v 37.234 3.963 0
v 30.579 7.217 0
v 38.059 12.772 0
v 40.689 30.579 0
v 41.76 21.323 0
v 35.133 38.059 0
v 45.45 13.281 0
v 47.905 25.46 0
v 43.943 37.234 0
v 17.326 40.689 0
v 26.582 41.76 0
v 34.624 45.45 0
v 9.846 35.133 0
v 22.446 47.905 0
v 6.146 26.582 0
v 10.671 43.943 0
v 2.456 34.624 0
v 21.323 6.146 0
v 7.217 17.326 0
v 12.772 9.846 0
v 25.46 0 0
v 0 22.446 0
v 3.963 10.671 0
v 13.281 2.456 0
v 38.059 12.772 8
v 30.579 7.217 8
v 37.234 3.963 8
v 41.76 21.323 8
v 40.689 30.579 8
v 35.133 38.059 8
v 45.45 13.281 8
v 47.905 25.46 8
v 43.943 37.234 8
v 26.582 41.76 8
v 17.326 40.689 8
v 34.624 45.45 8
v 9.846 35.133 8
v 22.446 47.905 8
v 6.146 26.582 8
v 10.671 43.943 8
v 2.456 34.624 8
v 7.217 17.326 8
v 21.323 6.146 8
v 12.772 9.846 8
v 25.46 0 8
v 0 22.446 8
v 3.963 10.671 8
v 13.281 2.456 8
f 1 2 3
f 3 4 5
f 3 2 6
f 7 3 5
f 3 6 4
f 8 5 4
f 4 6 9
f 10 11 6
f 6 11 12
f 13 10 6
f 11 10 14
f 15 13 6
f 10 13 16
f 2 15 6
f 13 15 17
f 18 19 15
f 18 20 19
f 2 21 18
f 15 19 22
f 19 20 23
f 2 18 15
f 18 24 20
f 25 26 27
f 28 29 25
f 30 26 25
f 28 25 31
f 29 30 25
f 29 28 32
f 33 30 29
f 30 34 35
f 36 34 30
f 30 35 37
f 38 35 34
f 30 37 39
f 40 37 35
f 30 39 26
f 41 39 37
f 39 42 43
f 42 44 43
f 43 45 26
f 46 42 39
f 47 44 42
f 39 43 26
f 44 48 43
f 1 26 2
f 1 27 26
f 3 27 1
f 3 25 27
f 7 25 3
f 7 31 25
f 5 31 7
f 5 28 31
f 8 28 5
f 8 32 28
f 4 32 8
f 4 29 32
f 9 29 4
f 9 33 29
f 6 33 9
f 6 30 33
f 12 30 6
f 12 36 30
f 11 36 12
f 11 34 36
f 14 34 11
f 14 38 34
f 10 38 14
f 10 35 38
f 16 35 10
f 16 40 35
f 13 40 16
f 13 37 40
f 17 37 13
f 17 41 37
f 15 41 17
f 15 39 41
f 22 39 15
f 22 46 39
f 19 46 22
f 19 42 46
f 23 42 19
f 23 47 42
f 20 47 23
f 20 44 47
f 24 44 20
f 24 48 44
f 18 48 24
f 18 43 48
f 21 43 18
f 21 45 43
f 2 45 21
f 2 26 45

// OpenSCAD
$fn = 32;

// ----------------------------------------------------------------------
// Chain sprocket: 12 teeth, 18 mm root radius
// ----------------------------------------------------------------------

// --- parameters (mm) ---
profile_height = 8;       // extrusion height
profile_points = 24;      // points of the closed outline

profile = [[41.76, 21.323], [47.905, 25.46], [40.689, 30.579], [43.943, 37.234], [35.133, 38.059], [34.624, 45.45], [26.582, 41.76], [22.446, 47.905], [17.326, 40.689], [10.671, 43.943], [9.846, 35.133], [2.456, 34.624], [6.146, 26.582], [0, 22.446], [7.217, 17.326], [3.963, 10.671], [12.772, 9.846], [13.281, 2.456], [21.323, 6.146], [25.46, 0], [30.579, 7.217], [37.234, 3.963], [38.059, 12.772], [45.45, 13.281]];  // single closed polygon, 24 points, counter clockwise

// --- the one profile operation ---
linear_extrude(height = profile_height) polygon(points = profile);
